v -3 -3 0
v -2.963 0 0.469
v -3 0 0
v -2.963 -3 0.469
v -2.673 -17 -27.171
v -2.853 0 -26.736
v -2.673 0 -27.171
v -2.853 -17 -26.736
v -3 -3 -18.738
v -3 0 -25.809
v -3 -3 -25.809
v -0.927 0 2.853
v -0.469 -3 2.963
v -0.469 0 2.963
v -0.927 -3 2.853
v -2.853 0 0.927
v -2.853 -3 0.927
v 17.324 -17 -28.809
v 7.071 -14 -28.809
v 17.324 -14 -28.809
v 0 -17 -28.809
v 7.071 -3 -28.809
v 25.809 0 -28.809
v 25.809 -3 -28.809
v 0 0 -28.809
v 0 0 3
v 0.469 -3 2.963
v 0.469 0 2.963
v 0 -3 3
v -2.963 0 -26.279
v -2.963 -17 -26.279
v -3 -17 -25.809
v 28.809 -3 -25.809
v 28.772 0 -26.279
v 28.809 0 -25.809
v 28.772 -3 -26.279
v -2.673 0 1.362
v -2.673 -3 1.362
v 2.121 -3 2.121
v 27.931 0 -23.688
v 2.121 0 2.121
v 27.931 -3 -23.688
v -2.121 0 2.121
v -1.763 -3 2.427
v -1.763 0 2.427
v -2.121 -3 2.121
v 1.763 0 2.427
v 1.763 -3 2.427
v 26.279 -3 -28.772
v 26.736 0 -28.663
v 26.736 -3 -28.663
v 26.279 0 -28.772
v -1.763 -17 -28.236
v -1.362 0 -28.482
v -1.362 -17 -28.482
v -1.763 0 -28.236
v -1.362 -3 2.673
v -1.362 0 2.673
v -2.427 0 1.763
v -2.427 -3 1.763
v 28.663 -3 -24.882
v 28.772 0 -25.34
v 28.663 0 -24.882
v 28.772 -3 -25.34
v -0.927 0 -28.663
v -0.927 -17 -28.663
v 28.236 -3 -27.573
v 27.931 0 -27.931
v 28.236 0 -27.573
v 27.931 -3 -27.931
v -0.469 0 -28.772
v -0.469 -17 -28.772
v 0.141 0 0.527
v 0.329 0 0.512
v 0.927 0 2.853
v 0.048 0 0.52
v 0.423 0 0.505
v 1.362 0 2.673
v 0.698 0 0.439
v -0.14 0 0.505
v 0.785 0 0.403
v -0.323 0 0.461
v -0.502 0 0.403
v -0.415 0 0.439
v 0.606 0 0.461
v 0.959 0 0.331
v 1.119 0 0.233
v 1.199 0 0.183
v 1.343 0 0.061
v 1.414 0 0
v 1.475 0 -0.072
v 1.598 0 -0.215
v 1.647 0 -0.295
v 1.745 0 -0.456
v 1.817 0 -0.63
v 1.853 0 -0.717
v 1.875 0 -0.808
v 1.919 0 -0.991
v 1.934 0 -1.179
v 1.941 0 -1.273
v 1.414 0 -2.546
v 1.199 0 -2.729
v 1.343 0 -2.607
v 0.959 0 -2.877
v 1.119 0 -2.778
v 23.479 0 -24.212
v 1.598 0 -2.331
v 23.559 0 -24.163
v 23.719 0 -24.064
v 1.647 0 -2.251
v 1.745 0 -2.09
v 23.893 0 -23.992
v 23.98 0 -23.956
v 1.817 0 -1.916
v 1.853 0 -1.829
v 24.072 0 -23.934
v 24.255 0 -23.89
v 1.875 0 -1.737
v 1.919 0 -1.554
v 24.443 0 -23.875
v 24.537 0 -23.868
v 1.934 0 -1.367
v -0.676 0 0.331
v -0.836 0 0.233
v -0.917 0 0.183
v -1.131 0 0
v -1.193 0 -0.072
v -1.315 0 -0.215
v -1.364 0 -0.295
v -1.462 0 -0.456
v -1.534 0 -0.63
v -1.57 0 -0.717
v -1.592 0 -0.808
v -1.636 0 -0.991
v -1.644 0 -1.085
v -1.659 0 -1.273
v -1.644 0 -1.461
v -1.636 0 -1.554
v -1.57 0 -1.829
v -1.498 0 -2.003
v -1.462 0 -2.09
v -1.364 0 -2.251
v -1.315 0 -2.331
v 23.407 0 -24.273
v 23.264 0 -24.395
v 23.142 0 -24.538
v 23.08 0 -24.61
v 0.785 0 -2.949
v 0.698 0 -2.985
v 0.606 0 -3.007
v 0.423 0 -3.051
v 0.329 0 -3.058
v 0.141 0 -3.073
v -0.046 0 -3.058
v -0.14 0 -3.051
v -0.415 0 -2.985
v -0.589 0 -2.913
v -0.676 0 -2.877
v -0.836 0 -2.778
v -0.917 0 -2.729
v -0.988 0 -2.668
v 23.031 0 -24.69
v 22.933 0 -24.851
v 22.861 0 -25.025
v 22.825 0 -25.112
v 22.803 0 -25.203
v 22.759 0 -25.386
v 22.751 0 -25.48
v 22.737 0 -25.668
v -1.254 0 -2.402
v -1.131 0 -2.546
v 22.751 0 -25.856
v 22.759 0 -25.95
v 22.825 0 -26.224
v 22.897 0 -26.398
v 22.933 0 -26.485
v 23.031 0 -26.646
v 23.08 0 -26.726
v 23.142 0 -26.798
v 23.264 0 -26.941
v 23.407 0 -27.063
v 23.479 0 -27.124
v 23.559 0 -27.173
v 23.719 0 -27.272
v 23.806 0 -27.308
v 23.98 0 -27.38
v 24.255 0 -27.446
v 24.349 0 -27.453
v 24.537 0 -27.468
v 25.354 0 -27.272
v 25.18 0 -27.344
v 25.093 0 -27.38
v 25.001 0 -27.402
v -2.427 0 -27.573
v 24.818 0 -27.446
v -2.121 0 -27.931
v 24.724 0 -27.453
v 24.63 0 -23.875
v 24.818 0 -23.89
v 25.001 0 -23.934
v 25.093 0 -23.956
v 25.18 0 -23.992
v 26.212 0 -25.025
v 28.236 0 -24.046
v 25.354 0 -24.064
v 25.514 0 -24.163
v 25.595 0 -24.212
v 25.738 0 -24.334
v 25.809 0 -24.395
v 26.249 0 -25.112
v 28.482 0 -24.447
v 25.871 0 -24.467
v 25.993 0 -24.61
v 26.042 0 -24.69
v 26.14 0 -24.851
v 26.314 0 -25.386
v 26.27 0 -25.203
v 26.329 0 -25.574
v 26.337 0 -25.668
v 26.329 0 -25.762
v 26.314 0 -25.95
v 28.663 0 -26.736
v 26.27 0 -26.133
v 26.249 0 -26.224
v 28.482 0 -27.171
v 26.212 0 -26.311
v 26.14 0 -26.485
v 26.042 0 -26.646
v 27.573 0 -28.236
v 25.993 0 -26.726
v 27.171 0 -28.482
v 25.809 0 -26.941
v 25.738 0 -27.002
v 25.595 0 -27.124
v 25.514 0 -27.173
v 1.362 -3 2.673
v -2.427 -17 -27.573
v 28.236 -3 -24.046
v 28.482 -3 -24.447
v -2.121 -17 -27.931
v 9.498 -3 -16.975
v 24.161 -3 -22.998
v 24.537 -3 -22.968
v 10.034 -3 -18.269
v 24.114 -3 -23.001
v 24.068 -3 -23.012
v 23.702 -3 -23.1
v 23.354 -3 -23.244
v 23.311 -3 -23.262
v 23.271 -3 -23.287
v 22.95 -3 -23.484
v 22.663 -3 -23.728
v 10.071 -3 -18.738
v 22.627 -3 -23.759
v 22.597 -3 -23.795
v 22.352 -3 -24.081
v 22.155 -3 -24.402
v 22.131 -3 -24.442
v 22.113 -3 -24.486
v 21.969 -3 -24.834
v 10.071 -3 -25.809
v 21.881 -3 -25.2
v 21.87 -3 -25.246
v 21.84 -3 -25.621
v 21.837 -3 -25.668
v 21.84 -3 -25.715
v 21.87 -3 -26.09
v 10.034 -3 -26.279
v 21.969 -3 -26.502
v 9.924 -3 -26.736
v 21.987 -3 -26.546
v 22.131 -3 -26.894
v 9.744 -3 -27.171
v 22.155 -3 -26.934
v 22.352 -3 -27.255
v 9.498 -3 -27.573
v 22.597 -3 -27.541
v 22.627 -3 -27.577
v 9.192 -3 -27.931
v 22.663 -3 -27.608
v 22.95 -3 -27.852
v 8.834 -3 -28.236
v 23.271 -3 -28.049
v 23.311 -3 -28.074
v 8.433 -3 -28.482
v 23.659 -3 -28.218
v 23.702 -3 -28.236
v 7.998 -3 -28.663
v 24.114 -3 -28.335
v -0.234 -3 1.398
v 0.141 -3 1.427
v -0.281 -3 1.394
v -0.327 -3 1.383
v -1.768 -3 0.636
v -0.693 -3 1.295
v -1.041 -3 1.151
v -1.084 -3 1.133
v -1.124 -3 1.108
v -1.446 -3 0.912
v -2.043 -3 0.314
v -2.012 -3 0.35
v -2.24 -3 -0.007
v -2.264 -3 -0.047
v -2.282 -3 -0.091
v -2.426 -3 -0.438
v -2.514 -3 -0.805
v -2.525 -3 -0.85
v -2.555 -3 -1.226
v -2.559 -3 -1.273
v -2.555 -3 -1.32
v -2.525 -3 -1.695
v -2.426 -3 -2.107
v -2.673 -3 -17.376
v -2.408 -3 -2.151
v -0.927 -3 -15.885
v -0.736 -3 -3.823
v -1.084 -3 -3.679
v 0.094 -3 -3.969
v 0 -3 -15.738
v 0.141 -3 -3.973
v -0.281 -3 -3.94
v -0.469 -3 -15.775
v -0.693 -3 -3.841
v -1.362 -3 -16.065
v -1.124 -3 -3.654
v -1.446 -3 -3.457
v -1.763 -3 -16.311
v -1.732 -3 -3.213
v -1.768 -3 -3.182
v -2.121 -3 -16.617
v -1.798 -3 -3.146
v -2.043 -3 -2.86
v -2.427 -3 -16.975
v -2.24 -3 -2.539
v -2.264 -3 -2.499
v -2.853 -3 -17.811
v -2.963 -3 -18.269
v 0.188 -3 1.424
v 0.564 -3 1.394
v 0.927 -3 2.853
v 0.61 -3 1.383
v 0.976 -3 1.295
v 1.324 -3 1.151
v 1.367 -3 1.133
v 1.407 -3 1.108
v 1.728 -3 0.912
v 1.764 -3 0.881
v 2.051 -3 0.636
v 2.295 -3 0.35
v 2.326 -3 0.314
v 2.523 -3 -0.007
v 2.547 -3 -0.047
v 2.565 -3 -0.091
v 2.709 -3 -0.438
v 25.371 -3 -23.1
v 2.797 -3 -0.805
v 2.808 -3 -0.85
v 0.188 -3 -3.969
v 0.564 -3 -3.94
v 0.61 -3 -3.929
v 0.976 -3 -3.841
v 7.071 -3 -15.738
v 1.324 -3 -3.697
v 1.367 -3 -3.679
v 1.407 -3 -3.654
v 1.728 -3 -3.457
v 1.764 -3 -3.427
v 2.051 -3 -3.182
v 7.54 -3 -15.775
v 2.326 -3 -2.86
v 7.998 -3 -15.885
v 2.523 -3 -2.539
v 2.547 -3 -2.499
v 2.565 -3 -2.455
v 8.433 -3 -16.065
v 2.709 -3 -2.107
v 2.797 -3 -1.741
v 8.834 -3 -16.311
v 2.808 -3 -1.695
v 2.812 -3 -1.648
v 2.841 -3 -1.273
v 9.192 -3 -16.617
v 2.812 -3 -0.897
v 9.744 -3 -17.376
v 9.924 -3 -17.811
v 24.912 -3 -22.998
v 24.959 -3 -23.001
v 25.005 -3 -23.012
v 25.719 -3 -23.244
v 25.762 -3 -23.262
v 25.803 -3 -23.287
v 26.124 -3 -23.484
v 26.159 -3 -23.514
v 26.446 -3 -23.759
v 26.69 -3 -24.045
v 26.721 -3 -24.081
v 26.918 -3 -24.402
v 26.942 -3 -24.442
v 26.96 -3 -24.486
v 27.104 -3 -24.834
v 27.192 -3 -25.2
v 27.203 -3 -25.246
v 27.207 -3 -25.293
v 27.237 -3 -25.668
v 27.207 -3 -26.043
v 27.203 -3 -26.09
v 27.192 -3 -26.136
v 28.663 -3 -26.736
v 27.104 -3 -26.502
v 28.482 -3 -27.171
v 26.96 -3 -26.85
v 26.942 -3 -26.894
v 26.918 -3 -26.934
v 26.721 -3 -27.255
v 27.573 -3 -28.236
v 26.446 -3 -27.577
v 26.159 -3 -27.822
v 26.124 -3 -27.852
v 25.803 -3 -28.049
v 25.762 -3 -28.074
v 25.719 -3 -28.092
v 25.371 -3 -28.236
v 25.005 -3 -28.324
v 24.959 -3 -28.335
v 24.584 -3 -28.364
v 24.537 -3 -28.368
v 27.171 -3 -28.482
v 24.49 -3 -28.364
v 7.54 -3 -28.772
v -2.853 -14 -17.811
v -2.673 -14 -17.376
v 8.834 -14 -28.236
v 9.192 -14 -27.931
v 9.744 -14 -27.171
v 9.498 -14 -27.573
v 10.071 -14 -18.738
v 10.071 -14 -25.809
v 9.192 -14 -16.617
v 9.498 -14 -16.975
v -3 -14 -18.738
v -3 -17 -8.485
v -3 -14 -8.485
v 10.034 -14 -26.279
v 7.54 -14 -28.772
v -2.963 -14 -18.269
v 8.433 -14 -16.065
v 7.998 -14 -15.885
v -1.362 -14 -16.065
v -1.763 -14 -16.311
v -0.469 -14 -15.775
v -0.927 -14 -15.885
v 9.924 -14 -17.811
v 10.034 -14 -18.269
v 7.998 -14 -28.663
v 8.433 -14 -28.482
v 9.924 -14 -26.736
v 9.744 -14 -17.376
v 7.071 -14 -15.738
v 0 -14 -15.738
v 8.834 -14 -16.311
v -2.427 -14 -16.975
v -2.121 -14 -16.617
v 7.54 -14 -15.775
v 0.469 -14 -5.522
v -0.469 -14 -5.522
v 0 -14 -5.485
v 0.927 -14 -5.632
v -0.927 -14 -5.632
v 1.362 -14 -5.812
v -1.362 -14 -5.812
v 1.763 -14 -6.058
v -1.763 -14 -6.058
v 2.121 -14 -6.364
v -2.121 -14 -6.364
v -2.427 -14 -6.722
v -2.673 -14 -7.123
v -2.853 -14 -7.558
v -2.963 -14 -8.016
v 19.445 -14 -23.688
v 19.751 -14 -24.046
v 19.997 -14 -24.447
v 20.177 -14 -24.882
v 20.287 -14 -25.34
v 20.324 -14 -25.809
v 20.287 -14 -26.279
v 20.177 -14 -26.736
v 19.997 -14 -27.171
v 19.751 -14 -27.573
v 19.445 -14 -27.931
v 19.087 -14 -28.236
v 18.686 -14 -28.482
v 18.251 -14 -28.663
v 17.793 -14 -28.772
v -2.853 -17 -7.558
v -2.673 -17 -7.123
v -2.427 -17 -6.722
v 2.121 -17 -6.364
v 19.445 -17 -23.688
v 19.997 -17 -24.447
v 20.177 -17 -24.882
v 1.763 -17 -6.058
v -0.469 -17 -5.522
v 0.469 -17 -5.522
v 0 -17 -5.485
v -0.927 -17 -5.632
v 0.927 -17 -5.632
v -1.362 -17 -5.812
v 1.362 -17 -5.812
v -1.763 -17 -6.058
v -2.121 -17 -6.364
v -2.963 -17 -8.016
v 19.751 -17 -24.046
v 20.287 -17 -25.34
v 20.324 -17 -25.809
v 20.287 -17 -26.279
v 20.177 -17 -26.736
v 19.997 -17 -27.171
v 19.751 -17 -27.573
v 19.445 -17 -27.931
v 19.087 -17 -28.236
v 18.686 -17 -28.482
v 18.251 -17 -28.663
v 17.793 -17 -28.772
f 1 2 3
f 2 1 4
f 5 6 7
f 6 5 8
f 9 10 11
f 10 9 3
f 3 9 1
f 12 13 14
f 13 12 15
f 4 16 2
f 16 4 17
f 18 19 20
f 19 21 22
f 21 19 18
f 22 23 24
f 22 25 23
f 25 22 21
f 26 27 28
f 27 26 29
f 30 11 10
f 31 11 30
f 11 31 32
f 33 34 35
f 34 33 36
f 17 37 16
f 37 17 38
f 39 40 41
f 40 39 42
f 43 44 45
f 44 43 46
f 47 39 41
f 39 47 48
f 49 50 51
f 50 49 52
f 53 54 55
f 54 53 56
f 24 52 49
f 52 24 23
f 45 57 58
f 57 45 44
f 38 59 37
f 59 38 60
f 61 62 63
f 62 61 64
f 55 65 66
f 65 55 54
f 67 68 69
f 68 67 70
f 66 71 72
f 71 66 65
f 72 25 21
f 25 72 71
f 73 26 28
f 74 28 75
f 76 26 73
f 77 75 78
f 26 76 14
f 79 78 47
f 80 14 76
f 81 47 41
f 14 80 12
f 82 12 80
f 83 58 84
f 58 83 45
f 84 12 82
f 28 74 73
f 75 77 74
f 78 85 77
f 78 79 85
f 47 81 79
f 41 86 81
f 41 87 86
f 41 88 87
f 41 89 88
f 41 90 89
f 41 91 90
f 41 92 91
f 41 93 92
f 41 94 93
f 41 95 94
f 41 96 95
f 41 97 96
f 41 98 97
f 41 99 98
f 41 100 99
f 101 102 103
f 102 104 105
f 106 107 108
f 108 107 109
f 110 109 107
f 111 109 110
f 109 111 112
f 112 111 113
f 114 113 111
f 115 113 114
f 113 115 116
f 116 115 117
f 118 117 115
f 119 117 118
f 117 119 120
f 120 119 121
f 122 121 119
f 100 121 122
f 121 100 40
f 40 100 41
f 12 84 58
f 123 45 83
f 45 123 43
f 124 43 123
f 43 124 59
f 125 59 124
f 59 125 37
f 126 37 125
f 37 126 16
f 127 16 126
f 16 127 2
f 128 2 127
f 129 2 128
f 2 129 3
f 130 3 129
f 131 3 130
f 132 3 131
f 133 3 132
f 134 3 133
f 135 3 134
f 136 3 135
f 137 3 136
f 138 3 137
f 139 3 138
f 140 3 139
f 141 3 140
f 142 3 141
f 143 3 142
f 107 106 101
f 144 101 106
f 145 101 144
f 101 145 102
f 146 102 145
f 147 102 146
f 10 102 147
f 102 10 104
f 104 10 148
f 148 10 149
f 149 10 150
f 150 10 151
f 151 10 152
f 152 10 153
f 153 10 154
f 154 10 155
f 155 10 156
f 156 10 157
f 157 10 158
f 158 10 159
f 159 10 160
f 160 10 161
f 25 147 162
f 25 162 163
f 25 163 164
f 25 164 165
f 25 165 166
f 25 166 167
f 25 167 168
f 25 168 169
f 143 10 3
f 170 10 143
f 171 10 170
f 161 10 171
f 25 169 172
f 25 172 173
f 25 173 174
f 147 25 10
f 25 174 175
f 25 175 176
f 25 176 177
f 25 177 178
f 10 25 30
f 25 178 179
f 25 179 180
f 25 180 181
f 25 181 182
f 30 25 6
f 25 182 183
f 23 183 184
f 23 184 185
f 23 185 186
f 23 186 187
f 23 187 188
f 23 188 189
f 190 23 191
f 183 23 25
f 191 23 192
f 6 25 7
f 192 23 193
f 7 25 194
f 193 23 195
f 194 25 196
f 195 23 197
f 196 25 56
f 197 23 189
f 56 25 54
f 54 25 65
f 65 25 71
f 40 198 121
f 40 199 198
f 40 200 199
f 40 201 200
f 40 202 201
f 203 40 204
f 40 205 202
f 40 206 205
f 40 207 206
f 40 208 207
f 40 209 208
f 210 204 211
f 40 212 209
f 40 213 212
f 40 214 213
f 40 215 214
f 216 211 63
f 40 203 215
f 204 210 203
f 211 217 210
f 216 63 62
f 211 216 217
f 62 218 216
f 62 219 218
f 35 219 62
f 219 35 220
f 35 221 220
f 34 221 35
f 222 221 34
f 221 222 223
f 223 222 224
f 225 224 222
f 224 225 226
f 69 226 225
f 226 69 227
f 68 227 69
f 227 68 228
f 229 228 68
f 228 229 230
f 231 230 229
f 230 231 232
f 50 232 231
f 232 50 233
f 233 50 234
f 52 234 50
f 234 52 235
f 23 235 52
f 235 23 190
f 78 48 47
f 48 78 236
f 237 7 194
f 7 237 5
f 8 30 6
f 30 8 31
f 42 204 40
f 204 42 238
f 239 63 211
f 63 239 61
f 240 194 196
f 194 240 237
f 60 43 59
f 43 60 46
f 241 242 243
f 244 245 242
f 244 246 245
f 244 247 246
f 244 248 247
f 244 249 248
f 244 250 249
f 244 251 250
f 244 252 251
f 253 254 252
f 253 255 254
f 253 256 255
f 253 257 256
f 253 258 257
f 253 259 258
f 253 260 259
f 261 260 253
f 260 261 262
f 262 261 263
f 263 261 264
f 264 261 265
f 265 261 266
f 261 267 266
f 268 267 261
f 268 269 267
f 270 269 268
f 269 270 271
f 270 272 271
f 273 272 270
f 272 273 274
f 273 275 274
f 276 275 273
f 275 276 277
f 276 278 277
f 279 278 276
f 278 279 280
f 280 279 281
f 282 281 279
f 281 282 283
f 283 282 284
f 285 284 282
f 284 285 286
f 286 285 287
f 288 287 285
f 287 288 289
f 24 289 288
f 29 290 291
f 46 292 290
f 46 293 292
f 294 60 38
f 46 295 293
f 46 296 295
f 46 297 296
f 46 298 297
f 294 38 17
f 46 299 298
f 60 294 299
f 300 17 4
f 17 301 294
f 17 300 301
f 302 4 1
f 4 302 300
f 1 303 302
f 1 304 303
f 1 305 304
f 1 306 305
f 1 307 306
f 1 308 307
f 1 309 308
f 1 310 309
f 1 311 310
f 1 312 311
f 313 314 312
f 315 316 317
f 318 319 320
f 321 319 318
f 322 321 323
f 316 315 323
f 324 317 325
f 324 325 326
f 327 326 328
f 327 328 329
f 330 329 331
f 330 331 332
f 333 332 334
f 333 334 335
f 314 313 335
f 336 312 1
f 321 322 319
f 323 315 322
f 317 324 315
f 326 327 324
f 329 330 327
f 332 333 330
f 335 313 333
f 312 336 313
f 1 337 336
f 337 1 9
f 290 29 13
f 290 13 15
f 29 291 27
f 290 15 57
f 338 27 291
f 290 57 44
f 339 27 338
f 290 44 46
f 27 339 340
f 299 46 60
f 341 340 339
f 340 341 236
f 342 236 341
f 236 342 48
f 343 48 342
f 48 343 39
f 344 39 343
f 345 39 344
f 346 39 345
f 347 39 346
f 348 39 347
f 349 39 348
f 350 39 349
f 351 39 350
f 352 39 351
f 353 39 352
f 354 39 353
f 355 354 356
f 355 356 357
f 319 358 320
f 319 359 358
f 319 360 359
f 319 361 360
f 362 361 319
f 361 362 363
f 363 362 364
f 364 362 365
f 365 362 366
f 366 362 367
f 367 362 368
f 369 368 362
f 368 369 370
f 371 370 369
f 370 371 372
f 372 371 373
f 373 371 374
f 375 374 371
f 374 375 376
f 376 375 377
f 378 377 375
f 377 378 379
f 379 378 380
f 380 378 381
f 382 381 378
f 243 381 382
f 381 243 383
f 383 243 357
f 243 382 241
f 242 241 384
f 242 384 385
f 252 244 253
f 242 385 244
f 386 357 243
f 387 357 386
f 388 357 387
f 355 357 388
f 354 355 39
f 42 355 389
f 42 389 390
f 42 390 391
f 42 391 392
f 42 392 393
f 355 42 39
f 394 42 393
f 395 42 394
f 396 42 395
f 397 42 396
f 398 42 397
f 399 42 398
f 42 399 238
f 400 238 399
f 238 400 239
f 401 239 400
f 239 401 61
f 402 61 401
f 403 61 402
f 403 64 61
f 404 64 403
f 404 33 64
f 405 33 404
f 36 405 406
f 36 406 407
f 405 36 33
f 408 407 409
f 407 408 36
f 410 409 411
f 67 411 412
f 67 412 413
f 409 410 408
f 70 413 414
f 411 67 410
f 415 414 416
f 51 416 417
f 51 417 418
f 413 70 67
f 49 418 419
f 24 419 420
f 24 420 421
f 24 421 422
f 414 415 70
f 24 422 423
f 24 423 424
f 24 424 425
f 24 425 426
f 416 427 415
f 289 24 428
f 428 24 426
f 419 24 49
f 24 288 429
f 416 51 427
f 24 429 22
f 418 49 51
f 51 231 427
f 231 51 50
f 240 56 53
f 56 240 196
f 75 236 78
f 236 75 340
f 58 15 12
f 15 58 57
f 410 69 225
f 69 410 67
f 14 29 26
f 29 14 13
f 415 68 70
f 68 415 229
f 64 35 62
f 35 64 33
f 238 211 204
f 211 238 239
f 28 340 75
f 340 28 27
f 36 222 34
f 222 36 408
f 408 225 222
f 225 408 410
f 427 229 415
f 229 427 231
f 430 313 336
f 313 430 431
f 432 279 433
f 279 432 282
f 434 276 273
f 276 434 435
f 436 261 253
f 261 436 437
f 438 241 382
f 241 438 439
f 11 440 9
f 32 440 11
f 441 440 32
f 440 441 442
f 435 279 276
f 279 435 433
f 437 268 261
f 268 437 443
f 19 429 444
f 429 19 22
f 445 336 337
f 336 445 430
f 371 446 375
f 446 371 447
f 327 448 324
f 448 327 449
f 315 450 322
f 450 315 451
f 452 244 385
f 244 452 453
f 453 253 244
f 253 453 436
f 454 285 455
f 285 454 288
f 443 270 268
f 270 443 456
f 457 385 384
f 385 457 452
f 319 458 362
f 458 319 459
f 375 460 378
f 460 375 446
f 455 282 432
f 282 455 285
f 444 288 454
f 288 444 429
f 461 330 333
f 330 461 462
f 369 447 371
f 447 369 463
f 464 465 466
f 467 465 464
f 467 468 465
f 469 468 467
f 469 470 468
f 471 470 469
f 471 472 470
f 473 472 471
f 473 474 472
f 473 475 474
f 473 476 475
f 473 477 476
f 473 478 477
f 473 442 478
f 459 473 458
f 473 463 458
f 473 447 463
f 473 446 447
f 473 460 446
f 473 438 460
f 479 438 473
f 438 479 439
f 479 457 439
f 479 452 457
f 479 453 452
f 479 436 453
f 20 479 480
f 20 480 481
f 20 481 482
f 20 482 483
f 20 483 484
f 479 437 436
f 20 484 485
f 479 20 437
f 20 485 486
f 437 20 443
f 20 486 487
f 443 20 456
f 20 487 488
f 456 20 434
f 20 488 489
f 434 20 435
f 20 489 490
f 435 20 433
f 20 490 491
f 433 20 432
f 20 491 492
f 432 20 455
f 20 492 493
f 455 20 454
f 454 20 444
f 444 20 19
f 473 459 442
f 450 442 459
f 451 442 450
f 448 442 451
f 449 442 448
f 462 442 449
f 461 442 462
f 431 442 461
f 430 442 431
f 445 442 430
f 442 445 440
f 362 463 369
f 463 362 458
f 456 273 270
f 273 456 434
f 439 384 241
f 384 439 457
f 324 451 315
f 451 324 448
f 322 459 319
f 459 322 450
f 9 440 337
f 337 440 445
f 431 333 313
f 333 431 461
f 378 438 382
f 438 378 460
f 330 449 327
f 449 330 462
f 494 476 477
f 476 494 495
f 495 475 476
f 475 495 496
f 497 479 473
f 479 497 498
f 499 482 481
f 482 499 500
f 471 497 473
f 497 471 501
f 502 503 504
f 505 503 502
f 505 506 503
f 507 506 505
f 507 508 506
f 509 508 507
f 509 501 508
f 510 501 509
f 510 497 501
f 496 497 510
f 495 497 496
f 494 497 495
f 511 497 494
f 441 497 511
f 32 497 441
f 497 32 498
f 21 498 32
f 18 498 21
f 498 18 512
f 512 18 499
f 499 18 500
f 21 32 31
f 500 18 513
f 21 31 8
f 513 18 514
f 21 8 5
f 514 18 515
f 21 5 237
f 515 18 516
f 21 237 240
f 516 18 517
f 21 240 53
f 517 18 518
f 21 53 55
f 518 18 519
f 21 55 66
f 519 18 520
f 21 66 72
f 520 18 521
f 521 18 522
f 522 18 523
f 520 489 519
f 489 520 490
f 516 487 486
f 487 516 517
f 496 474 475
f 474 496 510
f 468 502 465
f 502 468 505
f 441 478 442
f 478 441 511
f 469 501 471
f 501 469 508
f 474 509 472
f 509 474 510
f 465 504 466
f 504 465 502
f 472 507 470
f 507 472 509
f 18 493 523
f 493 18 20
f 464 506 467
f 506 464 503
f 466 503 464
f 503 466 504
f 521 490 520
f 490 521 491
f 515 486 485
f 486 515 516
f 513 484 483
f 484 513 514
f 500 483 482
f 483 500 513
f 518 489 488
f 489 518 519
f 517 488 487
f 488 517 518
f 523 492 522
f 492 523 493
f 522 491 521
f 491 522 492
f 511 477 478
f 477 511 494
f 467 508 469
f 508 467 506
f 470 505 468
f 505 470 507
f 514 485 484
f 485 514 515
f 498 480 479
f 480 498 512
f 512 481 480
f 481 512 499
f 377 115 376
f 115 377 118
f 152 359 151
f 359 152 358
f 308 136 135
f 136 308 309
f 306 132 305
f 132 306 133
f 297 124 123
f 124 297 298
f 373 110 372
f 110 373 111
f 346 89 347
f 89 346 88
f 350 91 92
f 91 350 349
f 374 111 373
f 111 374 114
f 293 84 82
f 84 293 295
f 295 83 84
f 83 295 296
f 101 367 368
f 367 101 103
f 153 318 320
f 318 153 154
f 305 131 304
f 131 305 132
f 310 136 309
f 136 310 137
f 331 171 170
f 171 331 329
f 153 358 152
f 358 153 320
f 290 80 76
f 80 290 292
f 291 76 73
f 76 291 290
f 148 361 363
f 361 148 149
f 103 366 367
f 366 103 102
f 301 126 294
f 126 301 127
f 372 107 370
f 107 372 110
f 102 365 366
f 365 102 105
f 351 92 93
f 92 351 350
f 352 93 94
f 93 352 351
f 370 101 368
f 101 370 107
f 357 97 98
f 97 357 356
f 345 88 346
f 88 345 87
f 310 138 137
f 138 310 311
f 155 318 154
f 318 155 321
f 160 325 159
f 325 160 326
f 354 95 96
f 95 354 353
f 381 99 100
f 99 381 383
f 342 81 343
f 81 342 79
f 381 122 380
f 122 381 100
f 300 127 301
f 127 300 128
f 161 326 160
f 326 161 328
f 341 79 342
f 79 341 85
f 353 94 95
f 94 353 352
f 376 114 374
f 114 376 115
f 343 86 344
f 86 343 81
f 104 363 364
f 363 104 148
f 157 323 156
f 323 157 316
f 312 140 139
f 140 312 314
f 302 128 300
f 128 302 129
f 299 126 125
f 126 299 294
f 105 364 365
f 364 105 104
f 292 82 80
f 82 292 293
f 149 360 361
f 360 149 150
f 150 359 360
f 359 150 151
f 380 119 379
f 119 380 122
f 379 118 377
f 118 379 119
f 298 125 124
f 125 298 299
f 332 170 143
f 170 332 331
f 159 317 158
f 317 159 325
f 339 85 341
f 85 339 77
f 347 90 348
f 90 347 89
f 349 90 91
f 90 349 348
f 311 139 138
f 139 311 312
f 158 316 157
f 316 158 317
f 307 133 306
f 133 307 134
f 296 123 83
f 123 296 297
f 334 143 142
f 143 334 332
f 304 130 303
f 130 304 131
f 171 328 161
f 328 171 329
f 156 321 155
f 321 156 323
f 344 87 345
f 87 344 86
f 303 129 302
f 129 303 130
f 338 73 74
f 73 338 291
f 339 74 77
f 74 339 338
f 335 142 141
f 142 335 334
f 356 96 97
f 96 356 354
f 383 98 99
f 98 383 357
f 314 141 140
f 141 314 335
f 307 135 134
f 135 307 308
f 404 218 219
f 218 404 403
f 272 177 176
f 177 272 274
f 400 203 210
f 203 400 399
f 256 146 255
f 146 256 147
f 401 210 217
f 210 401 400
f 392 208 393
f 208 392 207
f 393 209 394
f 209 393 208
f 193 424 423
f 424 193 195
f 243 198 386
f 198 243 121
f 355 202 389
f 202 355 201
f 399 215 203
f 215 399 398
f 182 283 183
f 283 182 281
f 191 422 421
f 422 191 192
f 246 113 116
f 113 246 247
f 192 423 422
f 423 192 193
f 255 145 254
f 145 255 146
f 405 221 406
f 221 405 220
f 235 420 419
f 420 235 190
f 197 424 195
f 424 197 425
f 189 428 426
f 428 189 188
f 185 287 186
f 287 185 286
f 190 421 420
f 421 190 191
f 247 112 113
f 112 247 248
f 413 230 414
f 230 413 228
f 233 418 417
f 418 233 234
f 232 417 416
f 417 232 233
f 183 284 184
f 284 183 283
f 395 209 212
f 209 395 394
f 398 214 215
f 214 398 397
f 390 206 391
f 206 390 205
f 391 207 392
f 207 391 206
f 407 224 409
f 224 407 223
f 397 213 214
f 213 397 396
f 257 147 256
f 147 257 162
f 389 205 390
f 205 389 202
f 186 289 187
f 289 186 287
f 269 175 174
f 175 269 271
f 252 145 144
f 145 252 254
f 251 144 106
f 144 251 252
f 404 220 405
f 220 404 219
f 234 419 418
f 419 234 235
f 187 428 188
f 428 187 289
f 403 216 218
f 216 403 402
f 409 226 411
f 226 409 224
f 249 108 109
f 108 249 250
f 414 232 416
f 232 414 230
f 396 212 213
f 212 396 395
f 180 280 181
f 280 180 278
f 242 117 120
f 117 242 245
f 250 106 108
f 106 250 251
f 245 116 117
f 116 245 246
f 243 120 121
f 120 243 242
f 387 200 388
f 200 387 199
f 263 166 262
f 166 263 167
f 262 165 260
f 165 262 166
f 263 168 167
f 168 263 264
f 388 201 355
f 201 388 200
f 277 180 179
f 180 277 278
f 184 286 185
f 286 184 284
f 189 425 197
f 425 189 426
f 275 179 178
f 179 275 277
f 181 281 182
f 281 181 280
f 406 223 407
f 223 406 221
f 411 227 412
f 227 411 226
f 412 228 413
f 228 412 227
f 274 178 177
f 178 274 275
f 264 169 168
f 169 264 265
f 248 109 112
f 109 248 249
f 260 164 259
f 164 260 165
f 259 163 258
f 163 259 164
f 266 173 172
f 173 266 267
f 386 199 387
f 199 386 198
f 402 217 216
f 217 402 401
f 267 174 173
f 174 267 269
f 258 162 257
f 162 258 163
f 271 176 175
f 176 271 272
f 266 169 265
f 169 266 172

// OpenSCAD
screw_holes = 3;//[2:20]
tool_handle_thickness=11;//[5:100]
tool_handle_inside_gape=10;//[3:50]
thickness=3;//[2:10]
/* [Hidden] */
$fn=40; 


rotate([90,45,0]){
difference() {
union() {
hull(){
translate([0,0,0])cylinder(h=thickness,r=screw_holes);
translate([(tool_handle_thickness*2)+(screw_holes*1.5)+tool_handle_inside_gape,0,0])cylinder(h=thickness,r=screw_holes);
translate([((tool_handle_thickness*2)+(screw_holes*1.5)+tool_handle_inside_gape)/2,-((tool_handle_thickness*2)+(screw_holes*1.5)+tool_handle_inside_gape)/2,0])cylinder(h=thickness,r=screw_holes);
}


hull(){
translate([((tool_handle_thickness*2)+(screw_holes*1.5)+tool_handle_inside_gape)/2,-((tool_handle_thickness*2)+(screw_holes*1.5)+tool_handle_inside_gape)/2,thickness])cylinder(h=tool_handle_thickness,r=screw_holes);

translate([((tool_handle_thickness*2)+(screw_holes*1.5)+tool_handle_inside_gape)/2-tool_handle_inside_gape/2,-((tool_handle_thickness*2)+(screw_holes*1.5)+tool_handle_inside_gape)/2+tool_handle_inside_gape/2,thickness])cylinder(h=tool_handle_thickness,r=screw_holes);

translate([((tool_handle_thickness*2)+(screw_holes*1.5)+tool_handle_inside_gape)/2+tool_handle_inside_gape/2,-((tool_handle_thickness*2)+(screw_holes*1.5)+tool_handle_inside_gape)/2+tool_handle_inside_gape/2,thickness])cylinder(h=tool_handle_thickness,r=screw_holes);

translate([((tool_handle_thickness*2)+(screw_holes*1.5)+tool_handle_inside_gape)/2,-((tool_handle_thickness*2)+(screw_holes*1.5)+tool_handle_inside_gape)/2+tool_handle_inside_gape,thickness])cylinder(h=tool_handle_thickness,r=screw_holes);

}

hull(){
translate([screw_holes*2,-screw_holes*2,tool_handle_thickness+thickness])cylinder(h=thickness,r=screw_holes);
translate([(tool_handle_thickness*2)+(screw_holes*1.5)+tool_handle_inside_gape-screw_holes*2,-screw_holes*2,tool_handle_thickness+thickness])cylinder(h=thickness,r=screw_holes);
translate([((tool_handle_thickness*2)+(screw_holes*1.5)+tool_handle_inside_gape)/2,-((tool_handle_thickness*2)+(screw_holes*1.5)+tool_handle_inside_gape)/2,tool_handle_thickness+thickness])cylinder(h=thickness,r=screw_holes);
}
}
translate([1,-.8,-1])cylinder(h=thickness+2,r1=screw_holes/2,r2=screw_holes);
translate([(tool_handle_thickness*2)+(screw_holes*1.5)+tool_handle_inside_gape-1,-.8,-1])cylinder(h=thickness+2,r1=screw_holes/2,r2=screw_holes);
}
}

